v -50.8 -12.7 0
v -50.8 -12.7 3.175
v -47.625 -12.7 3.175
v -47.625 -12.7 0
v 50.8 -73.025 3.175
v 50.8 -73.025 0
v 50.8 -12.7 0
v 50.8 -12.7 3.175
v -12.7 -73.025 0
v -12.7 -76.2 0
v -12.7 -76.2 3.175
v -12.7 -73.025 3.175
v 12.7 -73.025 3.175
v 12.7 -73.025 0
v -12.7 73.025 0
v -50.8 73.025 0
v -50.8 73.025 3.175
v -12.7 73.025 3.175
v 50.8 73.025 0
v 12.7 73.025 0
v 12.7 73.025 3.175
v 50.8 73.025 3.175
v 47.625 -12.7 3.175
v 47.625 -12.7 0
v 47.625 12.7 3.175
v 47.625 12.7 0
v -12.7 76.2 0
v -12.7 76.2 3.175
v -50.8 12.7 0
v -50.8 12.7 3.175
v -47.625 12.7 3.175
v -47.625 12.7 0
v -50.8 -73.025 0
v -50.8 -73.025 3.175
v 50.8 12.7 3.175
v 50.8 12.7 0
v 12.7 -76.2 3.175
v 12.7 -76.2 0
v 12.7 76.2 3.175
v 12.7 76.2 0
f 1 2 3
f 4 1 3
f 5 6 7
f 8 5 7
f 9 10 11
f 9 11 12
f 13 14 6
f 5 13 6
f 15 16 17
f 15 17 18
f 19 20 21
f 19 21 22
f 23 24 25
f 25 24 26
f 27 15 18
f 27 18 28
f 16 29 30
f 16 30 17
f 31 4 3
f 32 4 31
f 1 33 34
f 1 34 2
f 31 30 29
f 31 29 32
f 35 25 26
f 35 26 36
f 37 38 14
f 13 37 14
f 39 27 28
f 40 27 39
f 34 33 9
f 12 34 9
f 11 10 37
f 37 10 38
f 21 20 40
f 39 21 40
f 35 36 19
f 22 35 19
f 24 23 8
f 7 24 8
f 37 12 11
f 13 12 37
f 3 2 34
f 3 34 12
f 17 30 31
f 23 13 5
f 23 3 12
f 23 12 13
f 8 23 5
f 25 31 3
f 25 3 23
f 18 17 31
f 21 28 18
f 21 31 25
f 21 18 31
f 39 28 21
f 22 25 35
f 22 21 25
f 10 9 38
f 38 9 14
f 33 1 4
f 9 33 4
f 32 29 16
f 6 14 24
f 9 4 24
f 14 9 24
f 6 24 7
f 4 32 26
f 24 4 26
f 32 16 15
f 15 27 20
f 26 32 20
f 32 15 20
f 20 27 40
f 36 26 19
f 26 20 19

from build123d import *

# Parameters (mm, degrees)
F0_W     = 101.6
F0_H     = 146.05
F1_DEPTH = 3.175
F2_W     = 3.175
F2_H     = 25.4
F3_DEPTH = 3.175
F4_W     = 25.4
F4_H     = 3.175
F5_DEPTH = 3.175


with BuildPart() as f1:
    # F0 (on Top) → F1 (new body)
    with BuildSketch(Plane.XY):
        Rectangle(F0_W, F0_H)
    extrude(amount=F1_DEPTH)

    # F2 (on Top) → F3 (cut)
    with BuildSketch(Plane.XY):
        with Locations((-49.2125, 0)):
            Rectangle(F2_W, F2_H)
        with Locations((49.2125, 0)):
            Rectangle(F2_W, F2_H)
    extrude(amount=F3_DEPTH, mode=Mode.SUBTRACT)

    # F4 (on Top) → F5 (join)
    with BuildSketch(Plane.XY):
        with Locations((0, 74.6125)):
            Rectangle(F4_W, F4_H)
        with Locations((0, -74.6125)):
            Rectangle(F4_W, F4_H)
    extrude(amount=F5_DEPTH)


solid = f1.part
